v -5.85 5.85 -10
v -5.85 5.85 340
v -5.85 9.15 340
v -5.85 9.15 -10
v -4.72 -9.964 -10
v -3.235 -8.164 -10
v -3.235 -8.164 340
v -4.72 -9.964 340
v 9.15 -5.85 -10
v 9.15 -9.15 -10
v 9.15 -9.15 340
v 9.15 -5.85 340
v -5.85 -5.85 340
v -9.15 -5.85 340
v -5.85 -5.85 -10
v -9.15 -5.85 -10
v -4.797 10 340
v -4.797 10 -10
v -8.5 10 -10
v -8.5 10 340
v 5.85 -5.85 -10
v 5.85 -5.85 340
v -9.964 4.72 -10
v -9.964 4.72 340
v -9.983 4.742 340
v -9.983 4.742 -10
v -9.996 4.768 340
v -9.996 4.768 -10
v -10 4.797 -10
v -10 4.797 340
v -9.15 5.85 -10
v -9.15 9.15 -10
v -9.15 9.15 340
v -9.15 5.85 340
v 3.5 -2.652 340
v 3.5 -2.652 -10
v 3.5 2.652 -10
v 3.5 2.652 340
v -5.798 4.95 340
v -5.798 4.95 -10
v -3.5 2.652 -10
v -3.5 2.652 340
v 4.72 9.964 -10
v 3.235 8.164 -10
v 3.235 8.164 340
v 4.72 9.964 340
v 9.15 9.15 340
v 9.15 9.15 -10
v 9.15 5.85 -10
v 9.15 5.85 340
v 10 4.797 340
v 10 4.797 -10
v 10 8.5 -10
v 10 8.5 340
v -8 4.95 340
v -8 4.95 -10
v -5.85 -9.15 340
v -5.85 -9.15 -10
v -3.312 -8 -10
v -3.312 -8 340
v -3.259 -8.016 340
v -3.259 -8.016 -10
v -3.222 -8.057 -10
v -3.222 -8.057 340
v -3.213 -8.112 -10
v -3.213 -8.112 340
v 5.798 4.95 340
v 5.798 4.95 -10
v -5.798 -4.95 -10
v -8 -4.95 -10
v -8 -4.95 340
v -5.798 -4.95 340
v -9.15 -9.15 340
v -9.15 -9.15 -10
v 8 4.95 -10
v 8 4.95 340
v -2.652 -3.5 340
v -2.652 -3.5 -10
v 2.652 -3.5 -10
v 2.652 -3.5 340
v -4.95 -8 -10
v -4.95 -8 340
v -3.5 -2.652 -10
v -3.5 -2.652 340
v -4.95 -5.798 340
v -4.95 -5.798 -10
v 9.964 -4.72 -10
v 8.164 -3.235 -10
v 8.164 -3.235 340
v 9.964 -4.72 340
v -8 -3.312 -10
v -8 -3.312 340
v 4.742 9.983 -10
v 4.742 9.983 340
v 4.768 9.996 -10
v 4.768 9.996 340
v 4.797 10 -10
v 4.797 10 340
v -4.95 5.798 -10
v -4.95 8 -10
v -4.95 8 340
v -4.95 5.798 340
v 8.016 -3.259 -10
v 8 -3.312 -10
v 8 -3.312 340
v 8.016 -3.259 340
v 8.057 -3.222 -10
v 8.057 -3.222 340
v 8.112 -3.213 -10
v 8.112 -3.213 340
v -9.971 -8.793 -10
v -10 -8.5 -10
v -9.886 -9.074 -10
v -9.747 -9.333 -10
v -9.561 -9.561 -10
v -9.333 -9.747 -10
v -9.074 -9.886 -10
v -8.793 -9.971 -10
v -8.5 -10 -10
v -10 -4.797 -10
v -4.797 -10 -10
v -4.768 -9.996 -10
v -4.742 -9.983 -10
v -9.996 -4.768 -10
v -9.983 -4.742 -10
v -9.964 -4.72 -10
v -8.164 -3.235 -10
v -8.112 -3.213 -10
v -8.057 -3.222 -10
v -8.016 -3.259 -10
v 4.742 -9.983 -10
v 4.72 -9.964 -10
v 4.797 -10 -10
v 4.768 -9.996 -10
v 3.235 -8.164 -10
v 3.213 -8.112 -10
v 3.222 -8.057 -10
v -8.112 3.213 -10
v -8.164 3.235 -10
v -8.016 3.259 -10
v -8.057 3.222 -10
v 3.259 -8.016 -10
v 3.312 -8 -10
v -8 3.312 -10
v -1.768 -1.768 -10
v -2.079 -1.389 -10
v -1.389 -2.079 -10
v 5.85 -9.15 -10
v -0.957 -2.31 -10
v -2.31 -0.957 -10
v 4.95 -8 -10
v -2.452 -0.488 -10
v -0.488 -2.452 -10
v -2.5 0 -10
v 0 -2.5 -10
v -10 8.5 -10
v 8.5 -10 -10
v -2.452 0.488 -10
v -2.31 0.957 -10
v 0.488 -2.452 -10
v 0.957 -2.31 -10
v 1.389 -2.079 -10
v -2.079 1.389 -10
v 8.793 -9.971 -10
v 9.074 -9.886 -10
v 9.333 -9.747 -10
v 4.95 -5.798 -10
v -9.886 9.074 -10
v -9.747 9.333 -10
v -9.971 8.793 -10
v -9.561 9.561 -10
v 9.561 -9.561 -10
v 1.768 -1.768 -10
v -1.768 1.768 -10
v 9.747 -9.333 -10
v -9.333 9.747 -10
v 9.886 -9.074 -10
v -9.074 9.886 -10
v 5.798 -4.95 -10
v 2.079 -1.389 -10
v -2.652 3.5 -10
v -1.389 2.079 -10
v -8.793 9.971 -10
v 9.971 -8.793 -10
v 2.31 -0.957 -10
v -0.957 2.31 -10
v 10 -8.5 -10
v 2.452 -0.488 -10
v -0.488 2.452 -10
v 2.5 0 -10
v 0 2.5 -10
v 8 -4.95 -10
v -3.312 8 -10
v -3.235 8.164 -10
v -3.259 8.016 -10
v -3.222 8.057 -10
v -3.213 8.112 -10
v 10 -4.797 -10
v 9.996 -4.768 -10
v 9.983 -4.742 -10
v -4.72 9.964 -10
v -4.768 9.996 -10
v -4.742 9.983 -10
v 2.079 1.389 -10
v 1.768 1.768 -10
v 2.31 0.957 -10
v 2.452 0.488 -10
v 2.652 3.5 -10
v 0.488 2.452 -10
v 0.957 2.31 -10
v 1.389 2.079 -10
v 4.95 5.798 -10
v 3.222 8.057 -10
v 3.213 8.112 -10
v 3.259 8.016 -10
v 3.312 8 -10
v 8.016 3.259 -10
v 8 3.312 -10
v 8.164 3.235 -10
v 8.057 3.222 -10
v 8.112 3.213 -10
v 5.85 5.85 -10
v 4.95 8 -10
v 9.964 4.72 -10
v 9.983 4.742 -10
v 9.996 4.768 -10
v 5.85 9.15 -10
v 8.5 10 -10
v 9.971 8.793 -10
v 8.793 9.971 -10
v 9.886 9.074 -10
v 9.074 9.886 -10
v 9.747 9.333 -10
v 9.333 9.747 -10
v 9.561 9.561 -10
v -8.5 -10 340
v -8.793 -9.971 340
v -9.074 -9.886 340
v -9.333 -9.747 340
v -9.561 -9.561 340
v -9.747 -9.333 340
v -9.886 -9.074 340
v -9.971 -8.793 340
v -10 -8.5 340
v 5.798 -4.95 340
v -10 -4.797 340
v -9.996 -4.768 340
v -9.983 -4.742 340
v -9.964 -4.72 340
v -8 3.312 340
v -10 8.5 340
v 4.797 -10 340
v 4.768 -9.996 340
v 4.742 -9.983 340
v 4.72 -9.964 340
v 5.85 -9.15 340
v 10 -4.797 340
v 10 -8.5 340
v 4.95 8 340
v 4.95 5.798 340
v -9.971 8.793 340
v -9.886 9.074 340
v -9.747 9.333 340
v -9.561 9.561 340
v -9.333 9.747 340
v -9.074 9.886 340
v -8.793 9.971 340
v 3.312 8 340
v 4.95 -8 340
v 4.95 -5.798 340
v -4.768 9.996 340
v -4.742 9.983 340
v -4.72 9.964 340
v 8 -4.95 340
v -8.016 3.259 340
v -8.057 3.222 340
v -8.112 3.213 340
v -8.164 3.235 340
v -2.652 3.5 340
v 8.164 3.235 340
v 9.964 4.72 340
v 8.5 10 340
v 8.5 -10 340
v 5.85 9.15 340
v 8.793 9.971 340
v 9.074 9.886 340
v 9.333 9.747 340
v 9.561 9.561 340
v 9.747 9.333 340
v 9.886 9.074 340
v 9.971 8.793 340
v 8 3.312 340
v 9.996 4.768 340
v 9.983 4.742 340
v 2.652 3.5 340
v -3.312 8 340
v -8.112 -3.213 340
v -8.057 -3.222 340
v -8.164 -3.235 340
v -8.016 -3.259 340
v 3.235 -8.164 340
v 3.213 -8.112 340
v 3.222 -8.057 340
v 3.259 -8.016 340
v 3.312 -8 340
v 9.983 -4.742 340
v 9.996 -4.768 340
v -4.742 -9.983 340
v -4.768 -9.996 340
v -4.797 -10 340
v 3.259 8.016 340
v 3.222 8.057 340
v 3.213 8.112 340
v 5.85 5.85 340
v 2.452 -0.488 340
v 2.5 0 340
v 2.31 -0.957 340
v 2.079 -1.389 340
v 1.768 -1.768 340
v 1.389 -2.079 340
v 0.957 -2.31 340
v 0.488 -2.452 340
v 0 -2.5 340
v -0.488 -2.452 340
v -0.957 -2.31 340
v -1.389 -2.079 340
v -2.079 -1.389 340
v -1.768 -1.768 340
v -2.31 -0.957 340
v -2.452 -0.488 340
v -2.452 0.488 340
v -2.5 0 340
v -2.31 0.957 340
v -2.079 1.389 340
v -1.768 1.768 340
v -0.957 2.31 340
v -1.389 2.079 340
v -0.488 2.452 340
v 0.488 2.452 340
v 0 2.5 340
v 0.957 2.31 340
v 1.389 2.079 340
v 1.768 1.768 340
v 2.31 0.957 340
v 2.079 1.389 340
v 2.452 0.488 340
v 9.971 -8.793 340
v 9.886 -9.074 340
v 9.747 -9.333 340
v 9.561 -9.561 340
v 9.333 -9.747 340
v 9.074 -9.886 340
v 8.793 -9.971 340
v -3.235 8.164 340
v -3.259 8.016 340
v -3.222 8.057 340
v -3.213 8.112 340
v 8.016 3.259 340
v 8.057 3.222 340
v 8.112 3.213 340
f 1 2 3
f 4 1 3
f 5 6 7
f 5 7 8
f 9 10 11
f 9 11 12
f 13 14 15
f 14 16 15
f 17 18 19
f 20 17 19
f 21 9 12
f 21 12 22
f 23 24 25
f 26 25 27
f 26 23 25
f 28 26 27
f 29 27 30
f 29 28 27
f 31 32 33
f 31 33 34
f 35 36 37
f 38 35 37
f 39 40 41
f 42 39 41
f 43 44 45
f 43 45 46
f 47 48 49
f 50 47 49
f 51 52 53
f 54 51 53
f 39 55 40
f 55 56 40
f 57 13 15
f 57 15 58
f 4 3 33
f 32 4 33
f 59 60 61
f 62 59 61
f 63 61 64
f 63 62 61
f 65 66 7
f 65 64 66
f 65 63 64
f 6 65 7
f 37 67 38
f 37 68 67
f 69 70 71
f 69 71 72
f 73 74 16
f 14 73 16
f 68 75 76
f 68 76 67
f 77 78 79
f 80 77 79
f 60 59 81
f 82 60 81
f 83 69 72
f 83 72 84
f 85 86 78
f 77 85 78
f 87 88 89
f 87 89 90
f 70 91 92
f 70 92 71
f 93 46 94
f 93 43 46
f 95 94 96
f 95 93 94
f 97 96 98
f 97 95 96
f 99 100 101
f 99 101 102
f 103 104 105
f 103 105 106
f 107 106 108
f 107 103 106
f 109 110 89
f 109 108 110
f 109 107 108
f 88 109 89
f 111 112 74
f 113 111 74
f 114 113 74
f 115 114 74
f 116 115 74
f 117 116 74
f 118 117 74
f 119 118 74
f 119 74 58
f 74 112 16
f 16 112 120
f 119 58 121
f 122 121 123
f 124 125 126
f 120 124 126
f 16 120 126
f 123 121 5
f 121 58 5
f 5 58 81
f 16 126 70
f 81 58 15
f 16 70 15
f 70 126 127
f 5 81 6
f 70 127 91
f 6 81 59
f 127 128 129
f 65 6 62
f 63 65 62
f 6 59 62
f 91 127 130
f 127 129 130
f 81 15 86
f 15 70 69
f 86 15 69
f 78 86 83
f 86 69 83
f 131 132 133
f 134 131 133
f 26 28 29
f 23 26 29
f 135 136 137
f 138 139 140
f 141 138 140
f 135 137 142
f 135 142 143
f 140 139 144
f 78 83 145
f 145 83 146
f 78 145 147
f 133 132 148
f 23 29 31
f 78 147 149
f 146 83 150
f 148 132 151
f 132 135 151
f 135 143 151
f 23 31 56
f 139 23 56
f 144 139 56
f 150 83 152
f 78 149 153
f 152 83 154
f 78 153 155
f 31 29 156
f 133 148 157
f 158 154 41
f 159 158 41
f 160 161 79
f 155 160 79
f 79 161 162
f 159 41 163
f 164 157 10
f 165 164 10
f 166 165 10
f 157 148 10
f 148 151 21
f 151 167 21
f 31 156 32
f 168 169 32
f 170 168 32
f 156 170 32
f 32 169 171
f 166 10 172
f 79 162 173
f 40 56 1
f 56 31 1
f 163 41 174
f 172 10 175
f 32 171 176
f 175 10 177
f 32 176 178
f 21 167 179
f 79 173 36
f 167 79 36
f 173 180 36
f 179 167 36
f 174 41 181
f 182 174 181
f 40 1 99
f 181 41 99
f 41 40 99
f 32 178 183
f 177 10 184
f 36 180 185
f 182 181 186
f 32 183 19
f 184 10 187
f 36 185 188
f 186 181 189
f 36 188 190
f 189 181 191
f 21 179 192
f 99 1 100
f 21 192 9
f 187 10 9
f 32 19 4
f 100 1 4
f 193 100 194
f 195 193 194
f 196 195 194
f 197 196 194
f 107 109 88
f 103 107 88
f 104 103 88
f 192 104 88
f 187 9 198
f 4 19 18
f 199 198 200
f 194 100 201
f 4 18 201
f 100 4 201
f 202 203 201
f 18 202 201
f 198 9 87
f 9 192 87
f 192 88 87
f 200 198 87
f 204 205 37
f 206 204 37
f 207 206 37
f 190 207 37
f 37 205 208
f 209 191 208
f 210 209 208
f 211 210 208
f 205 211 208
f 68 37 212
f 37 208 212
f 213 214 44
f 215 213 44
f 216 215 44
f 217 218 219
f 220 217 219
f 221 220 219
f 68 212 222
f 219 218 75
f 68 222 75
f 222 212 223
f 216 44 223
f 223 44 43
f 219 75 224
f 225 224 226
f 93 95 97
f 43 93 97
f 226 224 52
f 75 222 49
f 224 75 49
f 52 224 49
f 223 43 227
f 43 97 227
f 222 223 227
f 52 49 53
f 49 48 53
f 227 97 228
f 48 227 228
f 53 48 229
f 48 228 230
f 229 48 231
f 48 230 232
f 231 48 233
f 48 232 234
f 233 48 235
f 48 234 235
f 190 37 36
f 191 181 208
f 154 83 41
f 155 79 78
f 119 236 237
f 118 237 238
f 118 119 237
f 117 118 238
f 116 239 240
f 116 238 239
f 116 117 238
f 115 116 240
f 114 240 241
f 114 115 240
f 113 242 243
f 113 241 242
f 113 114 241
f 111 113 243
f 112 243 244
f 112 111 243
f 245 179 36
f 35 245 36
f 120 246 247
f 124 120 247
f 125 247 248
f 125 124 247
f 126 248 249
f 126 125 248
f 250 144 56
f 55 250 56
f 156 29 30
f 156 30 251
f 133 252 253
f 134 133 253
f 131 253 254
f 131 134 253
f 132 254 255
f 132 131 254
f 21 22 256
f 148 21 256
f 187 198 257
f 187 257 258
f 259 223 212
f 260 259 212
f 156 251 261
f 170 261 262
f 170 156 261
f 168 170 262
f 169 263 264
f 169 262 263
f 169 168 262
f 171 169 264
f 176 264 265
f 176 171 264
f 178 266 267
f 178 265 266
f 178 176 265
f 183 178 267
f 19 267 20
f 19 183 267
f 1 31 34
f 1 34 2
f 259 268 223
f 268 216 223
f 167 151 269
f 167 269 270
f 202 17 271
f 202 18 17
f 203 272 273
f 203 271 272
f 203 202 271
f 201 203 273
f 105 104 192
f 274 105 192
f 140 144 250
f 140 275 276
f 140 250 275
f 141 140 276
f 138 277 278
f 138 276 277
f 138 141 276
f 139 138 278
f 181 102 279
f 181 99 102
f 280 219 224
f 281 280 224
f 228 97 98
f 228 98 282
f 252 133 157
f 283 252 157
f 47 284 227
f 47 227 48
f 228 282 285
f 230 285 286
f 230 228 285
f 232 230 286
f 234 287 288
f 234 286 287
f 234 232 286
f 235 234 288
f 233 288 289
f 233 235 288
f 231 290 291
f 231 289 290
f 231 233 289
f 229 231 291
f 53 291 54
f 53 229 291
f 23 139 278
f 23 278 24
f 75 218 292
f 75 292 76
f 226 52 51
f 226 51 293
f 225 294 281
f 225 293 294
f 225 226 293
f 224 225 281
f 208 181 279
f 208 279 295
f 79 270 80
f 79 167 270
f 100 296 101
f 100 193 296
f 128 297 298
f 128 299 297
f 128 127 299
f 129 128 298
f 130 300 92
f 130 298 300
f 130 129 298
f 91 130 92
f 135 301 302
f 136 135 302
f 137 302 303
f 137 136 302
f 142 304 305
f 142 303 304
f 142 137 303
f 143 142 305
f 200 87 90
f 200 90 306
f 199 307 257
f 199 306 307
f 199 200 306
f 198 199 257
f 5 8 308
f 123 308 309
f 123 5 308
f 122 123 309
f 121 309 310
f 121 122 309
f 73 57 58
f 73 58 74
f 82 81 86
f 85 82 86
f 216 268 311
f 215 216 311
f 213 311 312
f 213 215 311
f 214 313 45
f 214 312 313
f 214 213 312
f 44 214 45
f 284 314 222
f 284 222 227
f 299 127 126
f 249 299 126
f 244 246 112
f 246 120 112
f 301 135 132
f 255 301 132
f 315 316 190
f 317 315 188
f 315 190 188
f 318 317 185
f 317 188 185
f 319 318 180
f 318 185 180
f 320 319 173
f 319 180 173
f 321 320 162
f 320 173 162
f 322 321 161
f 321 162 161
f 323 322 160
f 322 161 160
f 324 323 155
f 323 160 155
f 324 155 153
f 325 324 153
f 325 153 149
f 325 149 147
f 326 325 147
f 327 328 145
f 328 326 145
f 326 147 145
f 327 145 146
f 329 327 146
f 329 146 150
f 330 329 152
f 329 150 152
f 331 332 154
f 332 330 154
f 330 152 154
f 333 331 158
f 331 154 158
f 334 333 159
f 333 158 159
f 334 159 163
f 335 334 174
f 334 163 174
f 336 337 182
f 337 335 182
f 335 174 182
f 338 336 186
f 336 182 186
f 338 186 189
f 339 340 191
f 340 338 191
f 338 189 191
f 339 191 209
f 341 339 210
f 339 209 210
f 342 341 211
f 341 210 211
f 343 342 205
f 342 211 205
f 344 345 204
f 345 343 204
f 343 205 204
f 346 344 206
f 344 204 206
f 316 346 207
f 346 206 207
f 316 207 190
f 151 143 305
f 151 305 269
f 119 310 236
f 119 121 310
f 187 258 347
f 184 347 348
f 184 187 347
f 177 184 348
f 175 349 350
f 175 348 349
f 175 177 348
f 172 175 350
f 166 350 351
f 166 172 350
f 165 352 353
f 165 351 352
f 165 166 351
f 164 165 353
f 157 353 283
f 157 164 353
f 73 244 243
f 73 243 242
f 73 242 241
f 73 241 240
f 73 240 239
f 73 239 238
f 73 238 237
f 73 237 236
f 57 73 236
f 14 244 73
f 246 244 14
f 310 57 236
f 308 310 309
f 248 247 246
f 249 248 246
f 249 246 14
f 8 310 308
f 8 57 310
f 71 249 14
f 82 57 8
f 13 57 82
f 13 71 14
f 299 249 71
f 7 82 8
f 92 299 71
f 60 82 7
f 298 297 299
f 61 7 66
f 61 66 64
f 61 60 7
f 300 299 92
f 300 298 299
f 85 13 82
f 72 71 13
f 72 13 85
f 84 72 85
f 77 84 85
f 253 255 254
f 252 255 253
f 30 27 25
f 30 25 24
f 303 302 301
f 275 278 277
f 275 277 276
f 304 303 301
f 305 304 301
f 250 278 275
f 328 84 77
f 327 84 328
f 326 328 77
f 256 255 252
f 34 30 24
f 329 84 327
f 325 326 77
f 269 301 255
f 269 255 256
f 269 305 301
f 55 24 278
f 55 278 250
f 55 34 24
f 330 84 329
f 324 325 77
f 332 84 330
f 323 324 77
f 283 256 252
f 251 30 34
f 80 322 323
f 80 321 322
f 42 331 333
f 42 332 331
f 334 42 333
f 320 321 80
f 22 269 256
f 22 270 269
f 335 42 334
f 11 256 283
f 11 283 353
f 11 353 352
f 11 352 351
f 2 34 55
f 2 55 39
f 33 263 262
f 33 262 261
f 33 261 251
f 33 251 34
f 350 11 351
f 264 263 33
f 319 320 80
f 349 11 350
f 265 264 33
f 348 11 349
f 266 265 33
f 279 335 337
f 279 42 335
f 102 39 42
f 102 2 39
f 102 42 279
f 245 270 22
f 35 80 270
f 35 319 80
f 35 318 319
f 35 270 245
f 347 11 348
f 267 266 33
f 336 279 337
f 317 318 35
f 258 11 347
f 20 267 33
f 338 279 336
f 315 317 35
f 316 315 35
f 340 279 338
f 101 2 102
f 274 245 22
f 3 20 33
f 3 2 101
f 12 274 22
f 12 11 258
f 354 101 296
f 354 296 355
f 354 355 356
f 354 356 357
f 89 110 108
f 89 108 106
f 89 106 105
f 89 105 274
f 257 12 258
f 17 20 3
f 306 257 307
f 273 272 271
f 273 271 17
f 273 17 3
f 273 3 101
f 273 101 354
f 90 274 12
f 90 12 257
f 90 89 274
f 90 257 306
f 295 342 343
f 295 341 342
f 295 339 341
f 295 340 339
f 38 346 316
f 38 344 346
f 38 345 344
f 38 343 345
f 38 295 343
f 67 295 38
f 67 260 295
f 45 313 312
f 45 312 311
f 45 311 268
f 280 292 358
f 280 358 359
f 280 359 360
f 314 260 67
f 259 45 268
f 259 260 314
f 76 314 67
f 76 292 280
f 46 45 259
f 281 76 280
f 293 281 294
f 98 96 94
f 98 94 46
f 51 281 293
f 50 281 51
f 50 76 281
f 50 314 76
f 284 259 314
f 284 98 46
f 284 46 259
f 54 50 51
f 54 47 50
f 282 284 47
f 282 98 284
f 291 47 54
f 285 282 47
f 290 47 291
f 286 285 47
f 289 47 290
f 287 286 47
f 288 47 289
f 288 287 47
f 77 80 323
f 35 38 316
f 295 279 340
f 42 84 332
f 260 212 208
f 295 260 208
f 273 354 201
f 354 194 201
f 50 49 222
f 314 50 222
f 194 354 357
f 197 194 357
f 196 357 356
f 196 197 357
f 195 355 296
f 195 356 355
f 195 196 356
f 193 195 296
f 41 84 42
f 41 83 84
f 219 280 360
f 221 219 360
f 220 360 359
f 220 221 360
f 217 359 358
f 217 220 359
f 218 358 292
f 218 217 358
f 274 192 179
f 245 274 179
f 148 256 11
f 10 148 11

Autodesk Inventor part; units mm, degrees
ref_plane "Начальная плоскость" through (0, 0, -10) normal (0, 0, 1) x (1, 0, 0)
ref_plane "Конечная плоскость" through (0, 0, 340) normal (0, 0, 1) x (1, 0, 0)
sketch "Эскиз" plane through (0, 0, 0) normal (0, 0, 1) x (1, 0, 0)
  line L0 (-14.4349, 0) -> (14.4349, 0) projected
  line L1 (0, -14) -> (0, 14) projected
  line L2 (0, 0) -> (7.5, 7.5) construction
  circle A0 centre (7.5, 7.5) radius 1.65 construction
  line L3 (5.85, 9.15) -> (9.15, 9.15)
  line L4 (9.15, 9.15) -> (9.15, 5.85)
  line L5 (9.15, 5.85) -> (5.85, 5.85)
  line L6 (5.85, 5.85) -> (5.85, 9.15)
  line L7 (3.235, 8.1636) -> (4.72, 9.9636)
  line L8 (4.7971, 10) -> (8.5, 10)
  line L9 (3.3121, 8) -> (4.95, 8)
  line L10 (4.95, 8) -> (4.95, 5.7985)
  line L11 (4.95, 5.7985) -> (2.6515, 3.5)
  line L12 (0, 3.5) -> (2.6515, 3.5)
  circle A1 centre (0, 0) radius 2.5
  line L13 (8.1636, 3.235) -> (9.9636, 4.72)
  line L14 (10, 4.7971) -> (10, 8.5)
  line L15 (8, 3.3121) -> (8, 4.95)
  line L16 (8, 4.95) -> (5.7985, 4.95)
  line L17 (5.7985, 4.95) -> (3.5, 2.6515)
  line L18 (3.5, 0) -> (3.5, 2.6515)
  arc A2 (10, 8.5) -> (8.5, 10) centre (8.5, 8.5) ccw
  line L19 (0, 0) -> (-7.5, 7.5) construction
  circle A3 centre (-7.5, 7.5) radius 1.65 construction
  line L20 (-5.85, 9.15) -> (-9.15, 9.15)
  line L21 (-9.15, 9.15) -> (-9.15, 5.85)
  line L22 (-9.15, 5.85) -> (-5.85, 5.85)
  line L23 (-5.85, 5.85) -> (-5.85, 9.15)
  line L24 (-3.235, 8.1636) -> (-4.72, 9.9636)
  line L25 (-4.7971, 10) -> (-8.5, 10)
  line L26 (-3.3121, 8) -> (-4.95, 8)
  line L27 (-4.95, 8) -> (-4.95, 5.7985)
  line L28 (-4.95, 5.7985) -> (-2.6515, 3.5)
  line L29 (0, 3.5) -> (-2.6515, 3.5)
  line L30 (-3.5, 0) -> (-3.5, 2.6515)
  line L31 (-5.7985, 4.95) -> (-3.5, 2.6515)
  line L32 (-8, 4.95) -> (-5.7985, 4.95)
  line L33 (-8, 3.3121) -> (-8, 4.95)
  line L34 (-8.1636, 3.235) -> (-9.9636, 4.72)
  line L35 (-10, 4.7971) -> (-10, 8.5)
  arc A4 (-8.5, 10) -> (-10, 8.5) centre (-8.5, 8.5) ccw
  line L36 (0, 14) -> (0, -14)
  line L37 (0, 0) -> (7.5, -7.5) construction
  circle A5 centre (7.5, -7.5) radius 1.65 construction
  line L38 (5.85, -9.15) -> (9.15, -9.15)
  line L39 (9.15, -9.15) -> (9.15, -5.85)
  line L40 (9.15, -5.85) -> (5.85, -5.85)
  line L41 (5.85, -5.85) -> (5.85, -9.15)
  line L42 (3.235, -8.1636) -> (4.72, -9.9636)
  line L43 (4.7971, -10) -> (8.5, -10)
  line L44 (3.3121, -8) -> (4.95, -8)
  line L45 (4.95, -8) -> (4.95, -5.7985)
  line L46 (4.95, -5.7985) -> (2.6515, -3.5)
  line L47 (0, -3.5) -> (2.6515, -3.5)
  line L48 (3.5, 0) -> (3.5, -2.6515)
  line L49 (5.7985, -4.95) -> (3.5, -2.6515)
  line L50 (8, -4.95) -> (5.7985, -4.95)
  line L51 (8, -3.3121) -> (8, -4.95)
  line L52 (8.1636, -3.235) -> (9.9636, -4.72)
  line L53 (10, -4.7971) -> (10, -8.5)
  arc A6 (8.5, -10) -> (10, -8.5) centre (8.5, -8.5) ccw
  line L54 (0, 0) -> (-7.5, -7.5) construction
  line L55 (-4.95, -8) -> (-4.95, -5.7985)
  line L56 (-3.3121, -8) -> (-4.95, -8)
  line L57 (-5.7985, -4.95) -> (-3.5, -2.6515)
  line L58 (-4.95, -5.7985) -> (-2.6515, -3.5)
  line L59 (-3.5, 0) -> (-3.5, -2.6515)
  line L60 (0, -3.5) -> (-2.6515, -3.5)
  circle A7 centre (-7.5, -7.5) radius 1.65 construction
  line L61 (-5.85, -5.85) -> (-5.85, -9.15)
  line L62 (-5.85, -9.15) -> (-9.15, -9.15)
  line L63 (-9.15, -9.15) -> (-9.15, -5.85)
  line L64 (-9.15, -5.85) -> (-5.85, -5.85)
  line L65 (-3.235, -8.1636) -> (-4.72, -9.9636)
  line L66 (-8, -4.95) -> (-5.7985, -4.95)
  line L67 (-8, -3.3121) -> (-8, -4.95)
  line L68 (-8.1636, -3.235) -> (-9.9636, -4.72)
  line L69 (-4.7971, -10) -> (-8.5, -10)
  line L70 (-10, -4.7971) -> (-10, -8.5)
  arc A8 (-10, -8.5) -> (-8.5, -10) centre (-8.5, -8.5) ccw
  arc A9 (3.235, 8.1636) -> (3.3121, 8) centre (3.3121, 8.1) ccw
  arc A10 (4.7971, 10) -> (4.72, 9.9636) centre (4.7971, 9.9) ccw
  arc A11 (8, 3.3121) -> (8.1636, 3.235) centre (8.1, 3.3121) ccw
  arc A12 (9.9636, 4.72) -> (10, 4.7971) centre (9.9, 4.7971) ccw
  arc A13 (-3.3121, 8) -> (-3.235, 8.1636) centre (-3.3121, 8.1) ccw
  arc A14 (-4.72, 9.9636) -> (-4.7971, 10) centre (-4.7971, 9.9) ccw
  arc A15 (-8.1636, 3.235) -> (-8, 3.3121) centre (-8.1, 3.3121) ccw
  arc A16 (-10, 4.7971) -> (-9.9636, 4.72) centre (-9.9, 4.7971) ccw
  arc A17 (-8, -3.3121) -> (-8.1636, -3.235) centre (-8.1, -3.3121) ccw
  arc A18 (-9.9636, -4.72) -> (-10, -4.7971) centre (-9.9, -4.7971) ccw
  arc A19 (-3.235, -8.1636) -> (-3.3121, -8) centre (-3.3121, -8.1) ccw
  arc A20 (-4.7971, -10) -> (-4.72, -9.9636) centre (-4.7971, -9.9) ccw
  arc A21 (4.72, -9.9636) -> (4.7971, -10) centre (4.7971, -9.9) ccw
  arc A22 (3.3121, -8) -> (3.235, -8.1636) centre (3.3121, -8.1) ccw
  arc A23 (8.1636, -3.235) -> (8, -3.3121) centre (8.1, -3.3121) ccw
  arc A24 (10, -4.7971) -> (9.9636, -4.72) centre (9.9, -4.7971) ccw
  point P0 (3.1, 8)
  point P1 (4.75, 10)
  point P2 (7.5, 9.15)
  point P3 (8, 3.1)
  point P4 (10, 4.75)
  point P5 (7.5, 5.85)
  point P6 (9.15, 7.5)
  point P7 (-3.1, 8)
  point P8 (-4.75, 10)
  point P9 (-7.5, 9.15)
  point P10 (-8, 3.1)
  point P11 (-10, 4.75)
  point P12 (-7.5, 5.85)
  point P13 (-9.15, 7.5)
  point P14 (3.1, -8)
  point P15 (4.75, -10)
  point P16 (7.5, -9.15)
  point P17 (8, -3.1)
  point P18 (10, -4.75)
  point P19 (7.5, -5.85)
  point P20 (9.15, -7.5)
  point P21 (-3.1, -8)
  point P22 (-7.5, -5.85)
  point P23 (-7.5, -9.15)
  point P24 (-9.15, -7.5)
  point P25 (-4.75, -10)
  point P26 (-8, -3.1)
  point P27 (-10, -4.75)
  dimension "d0" = 45
  dimension "d1" = 3.3
  dimension "d2" = 1.5
  dimension "d3" = 1.2
  dimension "d4" = 5
  dimension "d5" = 6.5
  dimension "d6" = 15
  dimension "d7" = 20
  dimension "d8" = 9.9
  dimension "d9" = 9.5
  dimension "d10" = 6.2
  dimension "d11" = 2
  dimension "d18" = 0.1
  dimension "d19" = 0.1
extrude "Тело" add sketch "Эскиз" along normal up to surface (350 mm away) from surface at -10 contours A1 L1 L12 L11 L10 L9 A9 L7 A10 L8 A2 L14 A12 L13 A11 L15 L16 L17 L18 L0 | L0 L48 L49 L50 L51 A23 L52 A24 L53 A6 L43 A21 L42 A22 L44 L45 L46 L47 L1 A1 | A1 L0 L30 L31 L32 L33 A15 L34 A16 L35 A4 L25 A14 L24 A13 L26 L27 L28 L29 L1 | L1 L60 L58 L55 L56 A19 L65 A20 L69 A8 L70 A18 L68 A17 L67 L66 L57 L59 L0 A1
sketch "Эскиз2" plane through (0, 0, 0) normal (0, 0, 1) x (1, 0, 0)
  line L0 (0, 0) -> (10, 0)
ref_plane "РабПлоскость3" through (0, 0, 0) normal (0, -1, 0) x (1, 0, 0)
sketch "Эскиз3" plane through (0, 0, 0) normal (0, -1, 0) x (1, 0, 0)
  line L0 (-2, -10) -> (12, -10)
  line L1 (-2, 340) -> (12, 340)
  dimension "d25" = 350
ref_plane "РабПлоскость4" through (-600, 0, -10) normal (0, 0, -1) x (-1, 0, 0)
split "Разделение1" plane through (-600, 0, -10) removes the side toward (0, 0, -1)
ref_plane "РабПлоскость5" through (0, 0, -10) normal (0, 0, -1) x (-1, 0, 0)
split "Разделение2" plane through (0, 0, -10) removes the side toward (0, 0, -1)
ref_plane "РабПлоскость6" through (-500, 0, 340) normal (0, 0, 1) x (1, 0, 0)
split "Разделение3" plane through (-500, 0, 340) removes the side toward (0, 0, 1)
ref_plane "РабПлоскость7" through (0, 10, 340) normal (0, 0, 1) x (1, 0, 0)
split "Разделение4" plane through (0, 10, 340) removes the side toward (0, 0, 1)
properties part number "короткая палка" material "Алюминий 6061"
